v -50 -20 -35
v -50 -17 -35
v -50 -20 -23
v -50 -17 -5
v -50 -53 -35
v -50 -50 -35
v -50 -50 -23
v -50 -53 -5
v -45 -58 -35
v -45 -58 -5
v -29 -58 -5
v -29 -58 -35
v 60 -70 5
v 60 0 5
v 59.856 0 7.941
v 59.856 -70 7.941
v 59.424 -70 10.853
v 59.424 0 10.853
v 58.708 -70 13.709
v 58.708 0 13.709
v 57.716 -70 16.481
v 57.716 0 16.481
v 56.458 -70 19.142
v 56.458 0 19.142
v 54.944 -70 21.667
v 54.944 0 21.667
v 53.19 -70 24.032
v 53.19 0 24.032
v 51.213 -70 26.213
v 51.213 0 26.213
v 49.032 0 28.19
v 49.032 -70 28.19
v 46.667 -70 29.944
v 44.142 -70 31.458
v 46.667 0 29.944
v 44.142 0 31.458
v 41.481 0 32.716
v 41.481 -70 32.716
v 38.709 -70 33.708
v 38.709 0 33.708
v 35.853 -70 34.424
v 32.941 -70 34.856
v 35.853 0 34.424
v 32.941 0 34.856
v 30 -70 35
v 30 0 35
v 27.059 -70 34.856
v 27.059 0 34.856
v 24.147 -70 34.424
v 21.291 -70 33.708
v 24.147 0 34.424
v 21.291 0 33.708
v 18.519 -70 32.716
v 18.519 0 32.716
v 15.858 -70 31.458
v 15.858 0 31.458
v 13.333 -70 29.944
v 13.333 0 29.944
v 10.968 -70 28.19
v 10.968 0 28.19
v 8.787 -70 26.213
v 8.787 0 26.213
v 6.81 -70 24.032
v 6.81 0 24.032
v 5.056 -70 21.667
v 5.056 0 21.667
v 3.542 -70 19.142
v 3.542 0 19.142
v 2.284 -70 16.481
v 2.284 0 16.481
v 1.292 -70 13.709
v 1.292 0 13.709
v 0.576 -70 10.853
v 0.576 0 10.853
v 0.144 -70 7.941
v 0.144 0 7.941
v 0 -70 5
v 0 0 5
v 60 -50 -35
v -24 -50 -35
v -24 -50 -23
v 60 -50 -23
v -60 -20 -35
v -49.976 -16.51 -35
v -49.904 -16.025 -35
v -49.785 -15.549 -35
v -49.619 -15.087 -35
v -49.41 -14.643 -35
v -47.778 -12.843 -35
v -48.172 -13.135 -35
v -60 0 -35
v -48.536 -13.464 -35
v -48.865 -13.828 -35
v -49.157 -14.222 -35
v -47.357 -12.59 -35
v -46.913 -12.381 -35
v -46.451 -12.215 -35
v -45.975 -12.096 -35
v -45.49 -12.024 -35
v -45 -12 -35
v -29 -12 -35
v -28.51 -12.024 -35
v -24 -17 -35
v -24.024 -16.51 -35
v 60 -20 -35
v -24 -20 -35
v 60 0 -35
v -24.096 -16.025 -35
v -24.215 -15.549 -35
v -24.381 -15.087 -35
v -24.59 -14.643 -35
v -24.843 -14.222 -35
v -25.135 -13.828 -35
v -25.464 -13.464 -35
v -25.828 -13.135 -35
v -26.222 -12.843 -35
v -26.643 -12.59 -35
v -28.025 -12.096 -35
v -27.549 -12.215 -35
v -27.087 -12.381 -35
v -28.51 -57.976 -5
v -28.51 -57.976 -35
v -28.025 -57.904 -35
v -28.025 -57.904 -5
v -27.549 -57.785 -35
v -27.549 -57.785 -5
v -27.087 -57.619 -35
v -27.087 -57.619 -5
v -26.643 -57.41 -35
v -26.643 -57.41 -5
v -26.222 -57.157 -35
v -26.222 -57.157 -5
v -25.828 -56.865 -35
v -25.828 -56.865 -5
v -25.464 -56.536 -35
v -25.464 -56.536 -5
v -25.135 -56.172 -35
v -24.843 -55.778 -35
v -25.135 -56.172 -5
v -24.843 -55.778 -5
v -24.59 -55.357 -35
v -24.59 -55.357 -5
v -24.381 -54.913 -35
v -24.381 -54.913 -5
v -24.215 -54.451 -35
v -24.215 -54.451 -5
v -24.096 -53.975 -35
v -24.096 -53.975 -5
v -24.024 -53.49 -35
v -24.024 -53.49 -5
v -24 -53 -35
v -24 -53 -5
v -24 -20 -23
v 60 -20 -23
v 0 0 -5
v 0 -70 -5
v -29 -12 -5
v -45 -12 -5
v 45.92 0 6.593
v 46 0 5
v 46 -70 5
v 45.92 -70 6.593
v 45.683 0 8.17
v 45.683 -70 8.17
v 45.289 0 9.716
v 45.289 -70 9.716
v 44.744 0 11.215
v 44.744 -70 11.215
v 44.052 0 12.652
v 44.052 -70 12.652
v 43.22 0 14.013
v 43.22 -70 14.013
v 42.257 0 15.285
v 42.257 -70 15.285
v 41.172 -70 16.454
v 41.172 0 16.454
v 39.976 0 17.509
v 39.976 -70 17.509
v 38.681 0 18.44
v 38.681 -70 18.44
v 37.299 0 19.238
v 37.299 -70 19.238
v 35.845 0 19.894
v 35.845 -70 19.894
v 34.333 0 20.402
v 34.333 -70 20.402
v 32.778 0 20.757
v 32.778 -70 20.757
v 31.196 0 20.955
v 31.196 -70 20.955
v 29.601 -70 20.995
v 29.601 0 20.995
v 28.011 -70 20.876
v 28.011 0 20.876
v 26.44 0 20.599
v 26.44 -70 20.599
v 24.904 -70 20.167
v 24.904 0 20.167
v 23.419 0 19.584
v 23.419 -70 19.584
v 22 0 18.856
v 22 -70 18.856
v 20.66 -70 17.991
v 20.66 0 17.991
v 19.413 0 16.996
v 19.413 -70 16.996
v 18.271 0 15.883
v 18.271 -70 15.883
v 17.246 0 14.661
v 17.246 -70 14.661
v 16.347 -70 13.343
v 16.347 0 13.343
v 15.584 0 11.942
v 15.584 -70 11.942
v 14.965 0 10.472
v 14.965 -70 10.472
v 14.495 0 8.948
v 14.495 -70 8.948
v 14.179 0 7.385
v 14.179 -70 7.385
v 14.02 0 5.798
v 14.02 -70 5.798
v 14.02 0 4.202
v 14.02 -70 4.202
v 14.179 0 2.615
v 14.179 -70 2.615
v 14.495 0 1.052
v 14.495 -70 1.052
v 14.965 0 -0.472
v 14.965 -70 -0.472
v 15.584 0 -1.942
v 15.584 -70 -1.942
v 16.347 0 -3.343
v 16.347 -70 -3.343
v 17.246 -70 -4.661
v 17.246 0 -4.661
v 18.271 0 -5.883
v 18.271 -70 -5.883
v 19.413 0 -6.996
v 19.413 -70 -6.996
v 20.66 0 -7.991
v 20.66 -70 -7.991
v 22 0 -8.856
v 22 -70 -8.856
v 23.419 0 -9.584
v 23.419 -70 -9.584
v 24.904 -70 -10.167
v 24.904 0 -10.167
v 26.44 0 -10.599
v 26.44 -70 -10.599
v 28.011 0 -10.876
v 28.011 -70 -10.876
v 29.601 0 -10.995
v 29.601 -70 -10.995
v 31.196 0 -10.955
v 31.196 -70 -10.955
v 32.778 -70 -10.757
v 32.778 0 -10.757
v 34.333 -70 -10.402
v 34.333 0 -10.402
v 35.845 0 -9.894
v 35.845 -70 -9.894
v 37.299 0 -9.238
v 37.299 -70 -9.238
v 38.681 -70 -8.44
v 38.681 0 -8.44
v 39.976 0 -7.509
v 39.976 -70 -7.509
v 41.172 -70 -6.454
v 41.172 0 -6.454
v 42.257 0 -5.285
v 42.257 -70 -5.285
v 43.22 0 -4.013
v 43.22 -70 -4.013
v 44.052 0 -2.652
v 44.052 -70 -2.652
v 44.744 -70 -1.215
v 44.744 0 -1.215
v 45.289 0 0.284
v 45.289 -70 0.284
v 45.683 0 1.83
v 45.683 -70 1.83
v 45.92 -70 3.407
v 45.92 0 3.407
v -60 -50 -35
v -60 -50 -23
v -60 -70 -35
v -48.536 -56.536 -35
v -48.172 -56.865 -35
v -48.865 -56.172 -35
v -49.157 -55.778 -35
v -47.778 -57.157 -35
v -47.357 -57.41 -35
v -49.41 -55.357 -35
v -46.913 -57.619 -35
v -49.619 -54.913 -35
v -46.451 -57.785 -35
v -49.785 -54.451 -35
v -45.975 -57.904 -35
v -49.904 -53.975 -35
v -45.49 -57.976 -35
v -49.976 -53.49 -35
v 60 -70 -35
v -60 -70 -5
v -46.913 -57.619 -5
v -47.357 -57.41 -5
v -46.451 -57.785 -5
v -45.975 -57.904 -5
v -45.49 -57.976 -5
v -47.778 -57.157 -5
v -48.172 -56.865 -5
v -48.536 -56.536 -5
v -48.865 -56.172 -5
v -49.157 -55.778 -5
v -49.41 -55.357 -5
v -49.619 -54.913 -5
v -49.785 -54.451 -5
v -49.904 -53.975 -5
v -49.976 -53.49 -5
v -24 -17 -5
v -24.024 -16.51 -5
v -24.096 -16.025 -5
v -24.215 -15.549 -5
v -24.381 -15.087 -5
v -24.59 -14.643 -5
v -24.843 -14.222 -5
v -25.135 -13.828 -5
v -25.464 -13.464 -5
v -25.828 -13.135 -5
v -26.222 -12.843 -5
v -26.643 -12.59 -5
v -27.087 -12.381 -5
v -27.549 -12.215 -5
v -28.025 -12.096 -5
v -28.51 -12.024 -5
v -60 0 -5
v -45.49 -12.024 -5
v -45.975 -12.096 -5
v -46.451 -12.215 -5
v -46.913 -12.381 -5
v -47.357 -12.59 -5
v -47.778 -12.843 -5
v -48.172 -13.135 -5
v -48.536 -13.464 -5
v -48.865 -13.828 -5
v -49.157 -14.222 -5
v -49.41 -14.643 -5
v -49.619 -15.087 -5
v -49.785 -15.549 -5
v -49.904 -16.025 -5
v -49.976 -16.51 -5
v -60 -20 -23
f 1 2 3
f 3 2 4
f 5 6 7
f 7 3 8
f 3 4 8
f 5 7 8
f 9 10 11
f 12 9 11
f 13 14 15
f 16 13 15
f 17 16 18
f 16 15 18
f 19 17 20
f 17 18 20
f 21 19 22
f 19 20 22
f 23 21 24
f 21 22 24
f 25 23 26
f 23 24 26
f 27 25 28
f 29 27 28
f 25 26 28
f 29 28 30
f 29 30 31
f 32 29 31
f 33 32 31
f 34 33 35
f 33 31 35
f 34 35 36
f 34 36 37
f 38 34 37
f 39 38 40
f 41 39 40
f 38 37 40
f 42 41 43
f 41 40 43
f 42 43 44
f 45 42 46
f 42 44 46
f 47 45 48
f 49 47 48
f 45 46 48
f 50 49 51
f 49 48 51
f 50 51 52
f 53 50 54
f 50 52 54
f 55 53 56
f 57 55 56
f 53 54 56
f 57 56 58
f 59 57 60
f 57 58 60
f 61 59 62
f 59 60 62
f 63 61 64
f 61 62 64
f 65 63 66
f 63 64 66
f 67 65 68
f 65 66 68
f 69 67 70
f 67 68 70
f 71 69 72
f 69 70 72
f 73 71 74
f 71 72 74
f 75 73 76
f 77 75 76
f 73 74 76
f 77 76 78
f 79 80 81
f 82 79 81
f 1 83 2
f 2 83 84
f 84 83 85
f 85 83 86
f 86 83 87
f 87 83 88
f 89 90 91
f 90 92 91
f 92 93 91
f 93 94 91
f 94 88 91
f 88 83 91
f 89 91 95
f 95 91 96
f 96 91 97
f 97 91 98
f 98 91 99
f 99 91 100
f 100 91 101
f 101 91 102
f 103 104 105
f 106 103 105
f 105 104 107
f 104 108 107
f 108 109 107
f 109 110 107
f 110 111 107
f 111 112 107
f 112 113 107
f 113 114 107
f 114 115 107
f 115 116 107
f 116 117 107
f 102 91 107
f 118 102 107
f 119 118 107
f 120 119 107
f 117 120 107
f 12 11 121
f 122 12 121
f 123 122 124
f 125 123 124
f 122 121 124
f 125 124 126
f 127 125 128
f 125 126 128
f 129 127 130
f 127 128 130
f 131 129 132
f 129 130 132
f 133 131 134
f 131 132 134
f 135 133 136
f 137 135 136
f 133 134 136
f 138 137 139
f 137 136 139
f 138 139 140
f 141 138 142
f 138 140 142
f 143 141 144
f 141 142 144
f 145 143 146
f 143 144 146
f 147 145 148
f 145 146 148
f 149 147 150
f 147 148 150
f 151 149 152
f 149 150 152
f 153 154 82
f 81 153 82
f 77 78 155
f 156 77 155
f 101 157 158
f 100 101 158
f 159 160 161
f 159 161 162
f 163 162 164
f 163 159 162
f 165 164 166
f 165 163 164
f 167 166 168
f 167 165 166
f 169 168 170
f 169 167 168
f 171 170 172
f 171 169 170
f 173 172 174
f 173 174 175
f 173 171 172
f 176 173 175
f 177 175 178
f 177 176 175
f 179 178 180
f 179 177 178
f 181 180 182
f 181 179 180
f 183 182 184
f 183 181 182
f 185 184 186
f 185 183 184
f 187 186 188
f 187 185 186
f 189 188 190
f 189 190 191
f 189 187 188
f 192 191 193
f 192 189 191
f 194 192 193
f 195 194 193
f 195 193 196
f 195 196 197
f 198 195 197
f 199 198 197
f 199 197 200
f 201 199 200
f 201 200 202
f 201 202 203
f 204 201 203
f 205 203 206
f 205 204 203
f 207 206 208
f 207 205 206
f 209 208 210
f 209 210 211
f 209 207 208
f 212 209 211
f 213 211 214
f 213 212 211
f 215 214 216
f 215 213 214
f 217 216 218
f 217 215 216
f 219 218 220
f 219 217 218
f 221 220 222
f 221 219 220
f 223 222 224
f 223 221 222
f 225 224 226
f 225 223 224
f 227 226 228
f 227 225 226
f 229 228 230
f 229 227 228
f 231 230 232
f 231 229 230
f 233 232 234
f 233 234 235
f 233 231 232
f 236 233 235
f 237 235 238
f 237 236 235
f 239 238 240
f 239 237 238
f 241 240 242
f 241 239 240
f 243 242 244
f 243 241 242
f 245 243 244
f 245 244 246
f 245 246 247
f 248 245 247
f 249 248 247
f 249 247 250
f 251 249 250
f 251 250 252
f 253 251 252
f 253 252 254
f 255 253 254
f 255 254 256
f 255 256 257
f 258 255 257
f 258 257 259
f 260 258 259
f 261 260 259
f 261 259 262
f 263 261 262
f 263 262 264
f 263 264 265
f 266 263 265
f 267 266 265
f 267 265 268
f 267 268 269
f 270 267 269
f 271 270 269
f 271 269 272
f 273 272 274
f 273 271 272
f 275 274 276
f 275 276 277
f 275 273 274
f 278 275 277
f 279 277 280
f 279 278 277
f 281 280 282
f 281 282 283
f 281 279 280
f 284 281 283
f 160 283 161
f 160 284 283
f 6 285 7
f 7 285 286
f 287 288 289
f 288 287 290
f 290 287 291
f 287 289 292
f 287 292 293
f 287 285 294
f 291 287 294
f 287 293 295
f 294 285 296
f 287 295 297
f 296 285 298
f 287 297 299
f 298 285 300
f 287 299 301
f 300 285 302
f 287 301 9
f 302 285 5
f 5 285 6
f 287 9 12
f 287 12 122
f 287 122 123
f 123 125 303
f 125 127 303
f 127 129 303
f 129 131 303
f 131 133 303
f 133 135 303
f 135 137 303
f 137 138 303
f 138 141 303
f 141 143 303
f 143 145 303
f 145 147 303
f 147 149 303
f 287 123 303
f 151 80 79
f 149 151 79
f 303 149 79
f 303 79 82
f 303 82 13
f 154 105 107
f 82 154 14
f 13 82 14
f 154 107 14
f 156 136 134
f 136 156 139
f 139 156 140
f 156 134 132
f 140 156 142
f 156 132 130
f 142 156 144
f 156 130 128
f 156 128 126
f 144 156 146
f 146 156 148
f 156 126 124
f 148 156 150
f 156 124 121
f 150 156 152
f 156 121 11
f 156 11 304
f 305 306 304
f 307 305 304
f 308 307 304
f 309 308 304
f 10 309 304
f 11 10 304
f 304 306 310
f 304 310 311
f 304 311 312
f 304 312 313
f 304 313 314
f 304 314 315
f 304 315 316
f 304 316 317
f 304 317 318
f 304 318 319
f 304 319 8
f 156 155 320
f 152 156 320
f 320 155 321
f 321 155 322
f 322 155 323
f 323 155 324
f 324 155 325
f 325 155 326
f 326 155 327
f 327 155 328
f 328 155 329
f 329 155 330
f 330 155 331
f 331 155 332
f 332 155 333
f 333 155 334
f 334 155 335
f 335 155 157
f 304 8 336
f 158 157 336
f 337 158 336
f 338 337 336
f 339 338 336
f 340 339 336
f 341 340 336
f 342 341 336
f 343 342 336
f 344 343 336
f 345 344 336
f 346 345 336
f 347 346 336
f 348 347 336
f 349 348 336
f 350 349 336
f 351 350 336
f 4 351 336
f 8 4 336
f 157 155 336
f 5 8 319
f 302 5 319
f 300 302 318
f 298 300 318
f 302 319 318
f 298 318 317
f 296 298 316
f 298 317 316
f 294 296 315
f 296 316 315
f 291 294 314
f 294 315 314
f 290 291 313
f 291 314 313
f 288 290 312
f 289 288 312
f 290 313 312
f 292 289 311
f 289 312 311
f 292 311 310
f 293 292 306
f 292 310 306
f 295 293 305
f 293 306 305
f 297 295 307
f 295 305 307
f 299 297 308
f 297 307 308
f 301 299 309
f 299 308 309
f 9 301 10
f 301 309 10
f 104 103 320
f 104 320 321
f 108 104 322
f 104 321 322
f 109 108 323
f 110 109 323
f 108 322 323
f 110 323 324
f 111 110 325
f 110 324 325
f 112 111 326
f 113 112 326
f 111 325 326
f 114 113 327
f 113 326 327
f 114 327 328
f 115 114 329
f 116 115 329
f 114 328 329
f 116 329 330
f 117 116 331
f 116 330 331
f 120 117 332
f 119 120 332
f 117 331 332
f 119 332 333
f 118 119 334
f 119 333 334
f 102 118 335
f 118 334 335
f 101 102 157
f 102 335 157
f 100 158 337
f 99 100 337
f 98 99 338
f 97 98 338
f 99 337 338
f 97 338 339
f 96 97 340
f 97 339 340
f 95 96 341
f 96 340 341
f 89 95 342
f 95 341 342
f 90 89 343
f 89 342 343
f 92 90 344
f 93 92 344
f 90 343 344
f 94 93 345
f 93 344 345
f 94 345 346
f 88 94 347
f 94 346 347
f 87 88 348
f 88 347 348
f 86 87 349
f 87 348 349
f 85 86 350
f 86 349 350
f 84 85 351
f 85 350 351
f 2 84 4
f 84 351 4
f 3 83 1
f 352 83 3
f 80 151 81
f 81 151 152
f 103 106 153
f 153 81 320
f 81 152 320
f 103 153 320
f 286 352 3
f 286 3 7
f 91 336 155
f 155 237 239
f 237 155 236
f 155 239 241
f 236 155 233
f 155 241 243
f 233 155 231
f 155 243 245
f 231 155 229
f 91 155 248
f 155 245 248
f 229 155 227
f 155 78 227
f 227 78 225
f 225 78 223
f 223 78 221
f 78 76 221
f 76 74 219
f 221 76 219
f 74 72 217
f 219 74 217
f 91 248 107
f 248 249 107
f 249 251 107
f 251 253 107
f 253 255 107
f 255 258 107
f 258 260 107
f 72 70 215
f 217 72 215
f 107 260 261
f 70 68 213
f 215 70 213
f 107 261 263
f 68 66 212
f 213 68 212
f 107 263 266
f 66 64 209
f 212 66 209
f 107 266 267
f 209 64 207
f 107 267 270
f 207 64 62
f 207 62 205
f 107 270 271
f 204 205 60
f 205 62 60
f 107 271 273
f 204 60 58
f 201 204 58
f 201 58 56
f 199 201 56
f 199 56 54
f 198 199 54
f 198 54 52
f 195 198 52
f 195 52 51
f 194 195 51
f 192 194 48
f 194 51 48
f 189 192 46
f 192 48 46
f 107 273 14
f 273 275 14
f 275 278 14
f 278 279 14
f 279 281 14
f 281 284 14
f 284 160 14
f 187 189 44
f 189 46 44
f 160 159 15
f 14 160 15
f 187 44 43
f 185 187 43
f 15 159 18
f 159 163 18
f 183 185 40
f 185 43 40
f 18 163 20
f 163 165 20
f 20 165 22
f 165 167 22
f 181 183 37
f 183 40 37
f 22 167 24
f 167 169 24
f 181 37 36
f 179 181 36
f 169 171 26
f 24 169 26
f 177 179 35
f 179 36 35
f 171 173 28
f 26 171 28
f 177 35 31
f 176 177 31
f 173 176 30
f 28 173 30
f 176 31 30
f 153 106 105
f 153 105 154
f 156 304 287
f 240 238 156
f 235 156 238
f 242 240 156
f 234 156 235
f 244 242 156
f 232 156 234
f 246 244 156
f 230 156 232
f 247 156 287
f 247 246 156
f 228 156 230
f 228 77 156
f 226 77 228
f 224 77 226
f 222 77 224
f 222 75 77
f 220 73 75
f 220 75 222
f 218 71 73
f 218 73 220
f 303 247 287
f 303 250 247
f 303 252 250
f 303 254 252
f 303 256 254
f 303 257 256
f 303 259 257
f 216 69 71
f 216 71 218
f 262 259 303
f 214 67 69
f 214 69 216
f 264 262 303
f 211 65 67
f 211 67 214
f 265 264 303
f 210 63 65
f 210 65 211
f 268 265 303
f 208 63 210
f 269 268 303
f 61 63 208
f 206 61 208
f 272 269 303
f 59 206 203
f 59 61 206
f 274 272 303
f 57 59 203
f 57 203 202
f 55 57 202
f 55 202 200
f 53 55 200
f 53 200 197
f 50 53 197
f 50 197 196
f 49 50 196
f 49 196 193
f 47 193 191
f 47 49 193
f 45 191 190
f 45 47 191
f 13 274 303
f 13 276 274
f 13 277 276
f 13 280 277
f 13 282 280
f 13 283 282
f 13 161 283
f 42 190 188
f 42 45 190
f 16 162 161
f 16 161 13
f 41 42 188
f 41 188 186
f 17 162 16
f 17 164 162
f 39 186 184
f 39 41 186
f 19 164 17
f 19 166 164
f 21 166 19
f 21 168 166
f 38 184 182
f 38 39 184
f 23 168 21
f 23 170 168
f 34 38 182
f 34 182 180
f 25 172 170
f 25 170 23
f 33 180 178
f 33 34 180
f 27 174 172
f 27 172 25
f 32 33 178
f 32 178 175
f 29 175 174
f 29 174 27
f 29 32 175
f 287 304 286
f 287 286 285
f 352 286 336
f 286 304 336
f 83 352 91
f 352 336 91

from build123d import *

# Parameters (mm, degrees)
F0_R     = 16
F1_DEPTH = 70
F3_DEPTH = 30.001
F4_W     = 30
F4_H     = 12
F5_DEPTH = 120.001


with BuildPart() as f1:
    # F0 (on Front) → F1 (new body)
    with BuildSketch(Plane.XZ):
        with BuildLine():
            Line((-60, -35), (60, -35))
            Line((60, -35), (60, 5))
            ThreePointArc((60, 5), (30, 35), (0, 5))
            Line((0, 5), (0, -5))
            Line((0, -5), (-60, -5))
            Line((-60, -5), (-60, -35))
        make_face()
        with Locations((30, 5)):
            Circle(F0_R, mode=Mode.SUBTRACT)
    extrude(amount=F1_DEPTH)

    # F2 (on face) → F3 (cut, through all)
    with BuildSketch(Plane.XY.offset(-5)):
        with BuildLine():
            Line((-45, -58), (-29, -58))
            ThreePointArc((-29, -58), (-25.464466, -56.535534), (-24, -53))
            Line((-24, -53), (-24, -17))
            ThreePointArc((-24, -17), (-25.464466, -13.464466), (-29, -12))
            Line((-29, -12), (-45, -12))
            ThreePointArc((-45, -12), (-48.535534, -13.464466), (-50, -17))
            Line((-50, -17), (-50, -53))
            ThreePointArc((-50, -53), (-48.535534, -56.535534), (-45, -58))
        make_face()
    extrude(amount=-F3_DEPTH, mode=Mode.SUBTRACT)

    # F4 (on face) → F5 (cut, through all)
    with BuildSketch(Plane(origin=(-60, 0, 0), x_dir=(0, -1, 0), z_dir=(-1, 0, 0))):
        with Locations((35, -29)):
            Rectangle(F4_W, F4_H)
    extrude(amount=-F5_DEPTH, mode=Mode.SUBTRACT)


solid = f1.part
